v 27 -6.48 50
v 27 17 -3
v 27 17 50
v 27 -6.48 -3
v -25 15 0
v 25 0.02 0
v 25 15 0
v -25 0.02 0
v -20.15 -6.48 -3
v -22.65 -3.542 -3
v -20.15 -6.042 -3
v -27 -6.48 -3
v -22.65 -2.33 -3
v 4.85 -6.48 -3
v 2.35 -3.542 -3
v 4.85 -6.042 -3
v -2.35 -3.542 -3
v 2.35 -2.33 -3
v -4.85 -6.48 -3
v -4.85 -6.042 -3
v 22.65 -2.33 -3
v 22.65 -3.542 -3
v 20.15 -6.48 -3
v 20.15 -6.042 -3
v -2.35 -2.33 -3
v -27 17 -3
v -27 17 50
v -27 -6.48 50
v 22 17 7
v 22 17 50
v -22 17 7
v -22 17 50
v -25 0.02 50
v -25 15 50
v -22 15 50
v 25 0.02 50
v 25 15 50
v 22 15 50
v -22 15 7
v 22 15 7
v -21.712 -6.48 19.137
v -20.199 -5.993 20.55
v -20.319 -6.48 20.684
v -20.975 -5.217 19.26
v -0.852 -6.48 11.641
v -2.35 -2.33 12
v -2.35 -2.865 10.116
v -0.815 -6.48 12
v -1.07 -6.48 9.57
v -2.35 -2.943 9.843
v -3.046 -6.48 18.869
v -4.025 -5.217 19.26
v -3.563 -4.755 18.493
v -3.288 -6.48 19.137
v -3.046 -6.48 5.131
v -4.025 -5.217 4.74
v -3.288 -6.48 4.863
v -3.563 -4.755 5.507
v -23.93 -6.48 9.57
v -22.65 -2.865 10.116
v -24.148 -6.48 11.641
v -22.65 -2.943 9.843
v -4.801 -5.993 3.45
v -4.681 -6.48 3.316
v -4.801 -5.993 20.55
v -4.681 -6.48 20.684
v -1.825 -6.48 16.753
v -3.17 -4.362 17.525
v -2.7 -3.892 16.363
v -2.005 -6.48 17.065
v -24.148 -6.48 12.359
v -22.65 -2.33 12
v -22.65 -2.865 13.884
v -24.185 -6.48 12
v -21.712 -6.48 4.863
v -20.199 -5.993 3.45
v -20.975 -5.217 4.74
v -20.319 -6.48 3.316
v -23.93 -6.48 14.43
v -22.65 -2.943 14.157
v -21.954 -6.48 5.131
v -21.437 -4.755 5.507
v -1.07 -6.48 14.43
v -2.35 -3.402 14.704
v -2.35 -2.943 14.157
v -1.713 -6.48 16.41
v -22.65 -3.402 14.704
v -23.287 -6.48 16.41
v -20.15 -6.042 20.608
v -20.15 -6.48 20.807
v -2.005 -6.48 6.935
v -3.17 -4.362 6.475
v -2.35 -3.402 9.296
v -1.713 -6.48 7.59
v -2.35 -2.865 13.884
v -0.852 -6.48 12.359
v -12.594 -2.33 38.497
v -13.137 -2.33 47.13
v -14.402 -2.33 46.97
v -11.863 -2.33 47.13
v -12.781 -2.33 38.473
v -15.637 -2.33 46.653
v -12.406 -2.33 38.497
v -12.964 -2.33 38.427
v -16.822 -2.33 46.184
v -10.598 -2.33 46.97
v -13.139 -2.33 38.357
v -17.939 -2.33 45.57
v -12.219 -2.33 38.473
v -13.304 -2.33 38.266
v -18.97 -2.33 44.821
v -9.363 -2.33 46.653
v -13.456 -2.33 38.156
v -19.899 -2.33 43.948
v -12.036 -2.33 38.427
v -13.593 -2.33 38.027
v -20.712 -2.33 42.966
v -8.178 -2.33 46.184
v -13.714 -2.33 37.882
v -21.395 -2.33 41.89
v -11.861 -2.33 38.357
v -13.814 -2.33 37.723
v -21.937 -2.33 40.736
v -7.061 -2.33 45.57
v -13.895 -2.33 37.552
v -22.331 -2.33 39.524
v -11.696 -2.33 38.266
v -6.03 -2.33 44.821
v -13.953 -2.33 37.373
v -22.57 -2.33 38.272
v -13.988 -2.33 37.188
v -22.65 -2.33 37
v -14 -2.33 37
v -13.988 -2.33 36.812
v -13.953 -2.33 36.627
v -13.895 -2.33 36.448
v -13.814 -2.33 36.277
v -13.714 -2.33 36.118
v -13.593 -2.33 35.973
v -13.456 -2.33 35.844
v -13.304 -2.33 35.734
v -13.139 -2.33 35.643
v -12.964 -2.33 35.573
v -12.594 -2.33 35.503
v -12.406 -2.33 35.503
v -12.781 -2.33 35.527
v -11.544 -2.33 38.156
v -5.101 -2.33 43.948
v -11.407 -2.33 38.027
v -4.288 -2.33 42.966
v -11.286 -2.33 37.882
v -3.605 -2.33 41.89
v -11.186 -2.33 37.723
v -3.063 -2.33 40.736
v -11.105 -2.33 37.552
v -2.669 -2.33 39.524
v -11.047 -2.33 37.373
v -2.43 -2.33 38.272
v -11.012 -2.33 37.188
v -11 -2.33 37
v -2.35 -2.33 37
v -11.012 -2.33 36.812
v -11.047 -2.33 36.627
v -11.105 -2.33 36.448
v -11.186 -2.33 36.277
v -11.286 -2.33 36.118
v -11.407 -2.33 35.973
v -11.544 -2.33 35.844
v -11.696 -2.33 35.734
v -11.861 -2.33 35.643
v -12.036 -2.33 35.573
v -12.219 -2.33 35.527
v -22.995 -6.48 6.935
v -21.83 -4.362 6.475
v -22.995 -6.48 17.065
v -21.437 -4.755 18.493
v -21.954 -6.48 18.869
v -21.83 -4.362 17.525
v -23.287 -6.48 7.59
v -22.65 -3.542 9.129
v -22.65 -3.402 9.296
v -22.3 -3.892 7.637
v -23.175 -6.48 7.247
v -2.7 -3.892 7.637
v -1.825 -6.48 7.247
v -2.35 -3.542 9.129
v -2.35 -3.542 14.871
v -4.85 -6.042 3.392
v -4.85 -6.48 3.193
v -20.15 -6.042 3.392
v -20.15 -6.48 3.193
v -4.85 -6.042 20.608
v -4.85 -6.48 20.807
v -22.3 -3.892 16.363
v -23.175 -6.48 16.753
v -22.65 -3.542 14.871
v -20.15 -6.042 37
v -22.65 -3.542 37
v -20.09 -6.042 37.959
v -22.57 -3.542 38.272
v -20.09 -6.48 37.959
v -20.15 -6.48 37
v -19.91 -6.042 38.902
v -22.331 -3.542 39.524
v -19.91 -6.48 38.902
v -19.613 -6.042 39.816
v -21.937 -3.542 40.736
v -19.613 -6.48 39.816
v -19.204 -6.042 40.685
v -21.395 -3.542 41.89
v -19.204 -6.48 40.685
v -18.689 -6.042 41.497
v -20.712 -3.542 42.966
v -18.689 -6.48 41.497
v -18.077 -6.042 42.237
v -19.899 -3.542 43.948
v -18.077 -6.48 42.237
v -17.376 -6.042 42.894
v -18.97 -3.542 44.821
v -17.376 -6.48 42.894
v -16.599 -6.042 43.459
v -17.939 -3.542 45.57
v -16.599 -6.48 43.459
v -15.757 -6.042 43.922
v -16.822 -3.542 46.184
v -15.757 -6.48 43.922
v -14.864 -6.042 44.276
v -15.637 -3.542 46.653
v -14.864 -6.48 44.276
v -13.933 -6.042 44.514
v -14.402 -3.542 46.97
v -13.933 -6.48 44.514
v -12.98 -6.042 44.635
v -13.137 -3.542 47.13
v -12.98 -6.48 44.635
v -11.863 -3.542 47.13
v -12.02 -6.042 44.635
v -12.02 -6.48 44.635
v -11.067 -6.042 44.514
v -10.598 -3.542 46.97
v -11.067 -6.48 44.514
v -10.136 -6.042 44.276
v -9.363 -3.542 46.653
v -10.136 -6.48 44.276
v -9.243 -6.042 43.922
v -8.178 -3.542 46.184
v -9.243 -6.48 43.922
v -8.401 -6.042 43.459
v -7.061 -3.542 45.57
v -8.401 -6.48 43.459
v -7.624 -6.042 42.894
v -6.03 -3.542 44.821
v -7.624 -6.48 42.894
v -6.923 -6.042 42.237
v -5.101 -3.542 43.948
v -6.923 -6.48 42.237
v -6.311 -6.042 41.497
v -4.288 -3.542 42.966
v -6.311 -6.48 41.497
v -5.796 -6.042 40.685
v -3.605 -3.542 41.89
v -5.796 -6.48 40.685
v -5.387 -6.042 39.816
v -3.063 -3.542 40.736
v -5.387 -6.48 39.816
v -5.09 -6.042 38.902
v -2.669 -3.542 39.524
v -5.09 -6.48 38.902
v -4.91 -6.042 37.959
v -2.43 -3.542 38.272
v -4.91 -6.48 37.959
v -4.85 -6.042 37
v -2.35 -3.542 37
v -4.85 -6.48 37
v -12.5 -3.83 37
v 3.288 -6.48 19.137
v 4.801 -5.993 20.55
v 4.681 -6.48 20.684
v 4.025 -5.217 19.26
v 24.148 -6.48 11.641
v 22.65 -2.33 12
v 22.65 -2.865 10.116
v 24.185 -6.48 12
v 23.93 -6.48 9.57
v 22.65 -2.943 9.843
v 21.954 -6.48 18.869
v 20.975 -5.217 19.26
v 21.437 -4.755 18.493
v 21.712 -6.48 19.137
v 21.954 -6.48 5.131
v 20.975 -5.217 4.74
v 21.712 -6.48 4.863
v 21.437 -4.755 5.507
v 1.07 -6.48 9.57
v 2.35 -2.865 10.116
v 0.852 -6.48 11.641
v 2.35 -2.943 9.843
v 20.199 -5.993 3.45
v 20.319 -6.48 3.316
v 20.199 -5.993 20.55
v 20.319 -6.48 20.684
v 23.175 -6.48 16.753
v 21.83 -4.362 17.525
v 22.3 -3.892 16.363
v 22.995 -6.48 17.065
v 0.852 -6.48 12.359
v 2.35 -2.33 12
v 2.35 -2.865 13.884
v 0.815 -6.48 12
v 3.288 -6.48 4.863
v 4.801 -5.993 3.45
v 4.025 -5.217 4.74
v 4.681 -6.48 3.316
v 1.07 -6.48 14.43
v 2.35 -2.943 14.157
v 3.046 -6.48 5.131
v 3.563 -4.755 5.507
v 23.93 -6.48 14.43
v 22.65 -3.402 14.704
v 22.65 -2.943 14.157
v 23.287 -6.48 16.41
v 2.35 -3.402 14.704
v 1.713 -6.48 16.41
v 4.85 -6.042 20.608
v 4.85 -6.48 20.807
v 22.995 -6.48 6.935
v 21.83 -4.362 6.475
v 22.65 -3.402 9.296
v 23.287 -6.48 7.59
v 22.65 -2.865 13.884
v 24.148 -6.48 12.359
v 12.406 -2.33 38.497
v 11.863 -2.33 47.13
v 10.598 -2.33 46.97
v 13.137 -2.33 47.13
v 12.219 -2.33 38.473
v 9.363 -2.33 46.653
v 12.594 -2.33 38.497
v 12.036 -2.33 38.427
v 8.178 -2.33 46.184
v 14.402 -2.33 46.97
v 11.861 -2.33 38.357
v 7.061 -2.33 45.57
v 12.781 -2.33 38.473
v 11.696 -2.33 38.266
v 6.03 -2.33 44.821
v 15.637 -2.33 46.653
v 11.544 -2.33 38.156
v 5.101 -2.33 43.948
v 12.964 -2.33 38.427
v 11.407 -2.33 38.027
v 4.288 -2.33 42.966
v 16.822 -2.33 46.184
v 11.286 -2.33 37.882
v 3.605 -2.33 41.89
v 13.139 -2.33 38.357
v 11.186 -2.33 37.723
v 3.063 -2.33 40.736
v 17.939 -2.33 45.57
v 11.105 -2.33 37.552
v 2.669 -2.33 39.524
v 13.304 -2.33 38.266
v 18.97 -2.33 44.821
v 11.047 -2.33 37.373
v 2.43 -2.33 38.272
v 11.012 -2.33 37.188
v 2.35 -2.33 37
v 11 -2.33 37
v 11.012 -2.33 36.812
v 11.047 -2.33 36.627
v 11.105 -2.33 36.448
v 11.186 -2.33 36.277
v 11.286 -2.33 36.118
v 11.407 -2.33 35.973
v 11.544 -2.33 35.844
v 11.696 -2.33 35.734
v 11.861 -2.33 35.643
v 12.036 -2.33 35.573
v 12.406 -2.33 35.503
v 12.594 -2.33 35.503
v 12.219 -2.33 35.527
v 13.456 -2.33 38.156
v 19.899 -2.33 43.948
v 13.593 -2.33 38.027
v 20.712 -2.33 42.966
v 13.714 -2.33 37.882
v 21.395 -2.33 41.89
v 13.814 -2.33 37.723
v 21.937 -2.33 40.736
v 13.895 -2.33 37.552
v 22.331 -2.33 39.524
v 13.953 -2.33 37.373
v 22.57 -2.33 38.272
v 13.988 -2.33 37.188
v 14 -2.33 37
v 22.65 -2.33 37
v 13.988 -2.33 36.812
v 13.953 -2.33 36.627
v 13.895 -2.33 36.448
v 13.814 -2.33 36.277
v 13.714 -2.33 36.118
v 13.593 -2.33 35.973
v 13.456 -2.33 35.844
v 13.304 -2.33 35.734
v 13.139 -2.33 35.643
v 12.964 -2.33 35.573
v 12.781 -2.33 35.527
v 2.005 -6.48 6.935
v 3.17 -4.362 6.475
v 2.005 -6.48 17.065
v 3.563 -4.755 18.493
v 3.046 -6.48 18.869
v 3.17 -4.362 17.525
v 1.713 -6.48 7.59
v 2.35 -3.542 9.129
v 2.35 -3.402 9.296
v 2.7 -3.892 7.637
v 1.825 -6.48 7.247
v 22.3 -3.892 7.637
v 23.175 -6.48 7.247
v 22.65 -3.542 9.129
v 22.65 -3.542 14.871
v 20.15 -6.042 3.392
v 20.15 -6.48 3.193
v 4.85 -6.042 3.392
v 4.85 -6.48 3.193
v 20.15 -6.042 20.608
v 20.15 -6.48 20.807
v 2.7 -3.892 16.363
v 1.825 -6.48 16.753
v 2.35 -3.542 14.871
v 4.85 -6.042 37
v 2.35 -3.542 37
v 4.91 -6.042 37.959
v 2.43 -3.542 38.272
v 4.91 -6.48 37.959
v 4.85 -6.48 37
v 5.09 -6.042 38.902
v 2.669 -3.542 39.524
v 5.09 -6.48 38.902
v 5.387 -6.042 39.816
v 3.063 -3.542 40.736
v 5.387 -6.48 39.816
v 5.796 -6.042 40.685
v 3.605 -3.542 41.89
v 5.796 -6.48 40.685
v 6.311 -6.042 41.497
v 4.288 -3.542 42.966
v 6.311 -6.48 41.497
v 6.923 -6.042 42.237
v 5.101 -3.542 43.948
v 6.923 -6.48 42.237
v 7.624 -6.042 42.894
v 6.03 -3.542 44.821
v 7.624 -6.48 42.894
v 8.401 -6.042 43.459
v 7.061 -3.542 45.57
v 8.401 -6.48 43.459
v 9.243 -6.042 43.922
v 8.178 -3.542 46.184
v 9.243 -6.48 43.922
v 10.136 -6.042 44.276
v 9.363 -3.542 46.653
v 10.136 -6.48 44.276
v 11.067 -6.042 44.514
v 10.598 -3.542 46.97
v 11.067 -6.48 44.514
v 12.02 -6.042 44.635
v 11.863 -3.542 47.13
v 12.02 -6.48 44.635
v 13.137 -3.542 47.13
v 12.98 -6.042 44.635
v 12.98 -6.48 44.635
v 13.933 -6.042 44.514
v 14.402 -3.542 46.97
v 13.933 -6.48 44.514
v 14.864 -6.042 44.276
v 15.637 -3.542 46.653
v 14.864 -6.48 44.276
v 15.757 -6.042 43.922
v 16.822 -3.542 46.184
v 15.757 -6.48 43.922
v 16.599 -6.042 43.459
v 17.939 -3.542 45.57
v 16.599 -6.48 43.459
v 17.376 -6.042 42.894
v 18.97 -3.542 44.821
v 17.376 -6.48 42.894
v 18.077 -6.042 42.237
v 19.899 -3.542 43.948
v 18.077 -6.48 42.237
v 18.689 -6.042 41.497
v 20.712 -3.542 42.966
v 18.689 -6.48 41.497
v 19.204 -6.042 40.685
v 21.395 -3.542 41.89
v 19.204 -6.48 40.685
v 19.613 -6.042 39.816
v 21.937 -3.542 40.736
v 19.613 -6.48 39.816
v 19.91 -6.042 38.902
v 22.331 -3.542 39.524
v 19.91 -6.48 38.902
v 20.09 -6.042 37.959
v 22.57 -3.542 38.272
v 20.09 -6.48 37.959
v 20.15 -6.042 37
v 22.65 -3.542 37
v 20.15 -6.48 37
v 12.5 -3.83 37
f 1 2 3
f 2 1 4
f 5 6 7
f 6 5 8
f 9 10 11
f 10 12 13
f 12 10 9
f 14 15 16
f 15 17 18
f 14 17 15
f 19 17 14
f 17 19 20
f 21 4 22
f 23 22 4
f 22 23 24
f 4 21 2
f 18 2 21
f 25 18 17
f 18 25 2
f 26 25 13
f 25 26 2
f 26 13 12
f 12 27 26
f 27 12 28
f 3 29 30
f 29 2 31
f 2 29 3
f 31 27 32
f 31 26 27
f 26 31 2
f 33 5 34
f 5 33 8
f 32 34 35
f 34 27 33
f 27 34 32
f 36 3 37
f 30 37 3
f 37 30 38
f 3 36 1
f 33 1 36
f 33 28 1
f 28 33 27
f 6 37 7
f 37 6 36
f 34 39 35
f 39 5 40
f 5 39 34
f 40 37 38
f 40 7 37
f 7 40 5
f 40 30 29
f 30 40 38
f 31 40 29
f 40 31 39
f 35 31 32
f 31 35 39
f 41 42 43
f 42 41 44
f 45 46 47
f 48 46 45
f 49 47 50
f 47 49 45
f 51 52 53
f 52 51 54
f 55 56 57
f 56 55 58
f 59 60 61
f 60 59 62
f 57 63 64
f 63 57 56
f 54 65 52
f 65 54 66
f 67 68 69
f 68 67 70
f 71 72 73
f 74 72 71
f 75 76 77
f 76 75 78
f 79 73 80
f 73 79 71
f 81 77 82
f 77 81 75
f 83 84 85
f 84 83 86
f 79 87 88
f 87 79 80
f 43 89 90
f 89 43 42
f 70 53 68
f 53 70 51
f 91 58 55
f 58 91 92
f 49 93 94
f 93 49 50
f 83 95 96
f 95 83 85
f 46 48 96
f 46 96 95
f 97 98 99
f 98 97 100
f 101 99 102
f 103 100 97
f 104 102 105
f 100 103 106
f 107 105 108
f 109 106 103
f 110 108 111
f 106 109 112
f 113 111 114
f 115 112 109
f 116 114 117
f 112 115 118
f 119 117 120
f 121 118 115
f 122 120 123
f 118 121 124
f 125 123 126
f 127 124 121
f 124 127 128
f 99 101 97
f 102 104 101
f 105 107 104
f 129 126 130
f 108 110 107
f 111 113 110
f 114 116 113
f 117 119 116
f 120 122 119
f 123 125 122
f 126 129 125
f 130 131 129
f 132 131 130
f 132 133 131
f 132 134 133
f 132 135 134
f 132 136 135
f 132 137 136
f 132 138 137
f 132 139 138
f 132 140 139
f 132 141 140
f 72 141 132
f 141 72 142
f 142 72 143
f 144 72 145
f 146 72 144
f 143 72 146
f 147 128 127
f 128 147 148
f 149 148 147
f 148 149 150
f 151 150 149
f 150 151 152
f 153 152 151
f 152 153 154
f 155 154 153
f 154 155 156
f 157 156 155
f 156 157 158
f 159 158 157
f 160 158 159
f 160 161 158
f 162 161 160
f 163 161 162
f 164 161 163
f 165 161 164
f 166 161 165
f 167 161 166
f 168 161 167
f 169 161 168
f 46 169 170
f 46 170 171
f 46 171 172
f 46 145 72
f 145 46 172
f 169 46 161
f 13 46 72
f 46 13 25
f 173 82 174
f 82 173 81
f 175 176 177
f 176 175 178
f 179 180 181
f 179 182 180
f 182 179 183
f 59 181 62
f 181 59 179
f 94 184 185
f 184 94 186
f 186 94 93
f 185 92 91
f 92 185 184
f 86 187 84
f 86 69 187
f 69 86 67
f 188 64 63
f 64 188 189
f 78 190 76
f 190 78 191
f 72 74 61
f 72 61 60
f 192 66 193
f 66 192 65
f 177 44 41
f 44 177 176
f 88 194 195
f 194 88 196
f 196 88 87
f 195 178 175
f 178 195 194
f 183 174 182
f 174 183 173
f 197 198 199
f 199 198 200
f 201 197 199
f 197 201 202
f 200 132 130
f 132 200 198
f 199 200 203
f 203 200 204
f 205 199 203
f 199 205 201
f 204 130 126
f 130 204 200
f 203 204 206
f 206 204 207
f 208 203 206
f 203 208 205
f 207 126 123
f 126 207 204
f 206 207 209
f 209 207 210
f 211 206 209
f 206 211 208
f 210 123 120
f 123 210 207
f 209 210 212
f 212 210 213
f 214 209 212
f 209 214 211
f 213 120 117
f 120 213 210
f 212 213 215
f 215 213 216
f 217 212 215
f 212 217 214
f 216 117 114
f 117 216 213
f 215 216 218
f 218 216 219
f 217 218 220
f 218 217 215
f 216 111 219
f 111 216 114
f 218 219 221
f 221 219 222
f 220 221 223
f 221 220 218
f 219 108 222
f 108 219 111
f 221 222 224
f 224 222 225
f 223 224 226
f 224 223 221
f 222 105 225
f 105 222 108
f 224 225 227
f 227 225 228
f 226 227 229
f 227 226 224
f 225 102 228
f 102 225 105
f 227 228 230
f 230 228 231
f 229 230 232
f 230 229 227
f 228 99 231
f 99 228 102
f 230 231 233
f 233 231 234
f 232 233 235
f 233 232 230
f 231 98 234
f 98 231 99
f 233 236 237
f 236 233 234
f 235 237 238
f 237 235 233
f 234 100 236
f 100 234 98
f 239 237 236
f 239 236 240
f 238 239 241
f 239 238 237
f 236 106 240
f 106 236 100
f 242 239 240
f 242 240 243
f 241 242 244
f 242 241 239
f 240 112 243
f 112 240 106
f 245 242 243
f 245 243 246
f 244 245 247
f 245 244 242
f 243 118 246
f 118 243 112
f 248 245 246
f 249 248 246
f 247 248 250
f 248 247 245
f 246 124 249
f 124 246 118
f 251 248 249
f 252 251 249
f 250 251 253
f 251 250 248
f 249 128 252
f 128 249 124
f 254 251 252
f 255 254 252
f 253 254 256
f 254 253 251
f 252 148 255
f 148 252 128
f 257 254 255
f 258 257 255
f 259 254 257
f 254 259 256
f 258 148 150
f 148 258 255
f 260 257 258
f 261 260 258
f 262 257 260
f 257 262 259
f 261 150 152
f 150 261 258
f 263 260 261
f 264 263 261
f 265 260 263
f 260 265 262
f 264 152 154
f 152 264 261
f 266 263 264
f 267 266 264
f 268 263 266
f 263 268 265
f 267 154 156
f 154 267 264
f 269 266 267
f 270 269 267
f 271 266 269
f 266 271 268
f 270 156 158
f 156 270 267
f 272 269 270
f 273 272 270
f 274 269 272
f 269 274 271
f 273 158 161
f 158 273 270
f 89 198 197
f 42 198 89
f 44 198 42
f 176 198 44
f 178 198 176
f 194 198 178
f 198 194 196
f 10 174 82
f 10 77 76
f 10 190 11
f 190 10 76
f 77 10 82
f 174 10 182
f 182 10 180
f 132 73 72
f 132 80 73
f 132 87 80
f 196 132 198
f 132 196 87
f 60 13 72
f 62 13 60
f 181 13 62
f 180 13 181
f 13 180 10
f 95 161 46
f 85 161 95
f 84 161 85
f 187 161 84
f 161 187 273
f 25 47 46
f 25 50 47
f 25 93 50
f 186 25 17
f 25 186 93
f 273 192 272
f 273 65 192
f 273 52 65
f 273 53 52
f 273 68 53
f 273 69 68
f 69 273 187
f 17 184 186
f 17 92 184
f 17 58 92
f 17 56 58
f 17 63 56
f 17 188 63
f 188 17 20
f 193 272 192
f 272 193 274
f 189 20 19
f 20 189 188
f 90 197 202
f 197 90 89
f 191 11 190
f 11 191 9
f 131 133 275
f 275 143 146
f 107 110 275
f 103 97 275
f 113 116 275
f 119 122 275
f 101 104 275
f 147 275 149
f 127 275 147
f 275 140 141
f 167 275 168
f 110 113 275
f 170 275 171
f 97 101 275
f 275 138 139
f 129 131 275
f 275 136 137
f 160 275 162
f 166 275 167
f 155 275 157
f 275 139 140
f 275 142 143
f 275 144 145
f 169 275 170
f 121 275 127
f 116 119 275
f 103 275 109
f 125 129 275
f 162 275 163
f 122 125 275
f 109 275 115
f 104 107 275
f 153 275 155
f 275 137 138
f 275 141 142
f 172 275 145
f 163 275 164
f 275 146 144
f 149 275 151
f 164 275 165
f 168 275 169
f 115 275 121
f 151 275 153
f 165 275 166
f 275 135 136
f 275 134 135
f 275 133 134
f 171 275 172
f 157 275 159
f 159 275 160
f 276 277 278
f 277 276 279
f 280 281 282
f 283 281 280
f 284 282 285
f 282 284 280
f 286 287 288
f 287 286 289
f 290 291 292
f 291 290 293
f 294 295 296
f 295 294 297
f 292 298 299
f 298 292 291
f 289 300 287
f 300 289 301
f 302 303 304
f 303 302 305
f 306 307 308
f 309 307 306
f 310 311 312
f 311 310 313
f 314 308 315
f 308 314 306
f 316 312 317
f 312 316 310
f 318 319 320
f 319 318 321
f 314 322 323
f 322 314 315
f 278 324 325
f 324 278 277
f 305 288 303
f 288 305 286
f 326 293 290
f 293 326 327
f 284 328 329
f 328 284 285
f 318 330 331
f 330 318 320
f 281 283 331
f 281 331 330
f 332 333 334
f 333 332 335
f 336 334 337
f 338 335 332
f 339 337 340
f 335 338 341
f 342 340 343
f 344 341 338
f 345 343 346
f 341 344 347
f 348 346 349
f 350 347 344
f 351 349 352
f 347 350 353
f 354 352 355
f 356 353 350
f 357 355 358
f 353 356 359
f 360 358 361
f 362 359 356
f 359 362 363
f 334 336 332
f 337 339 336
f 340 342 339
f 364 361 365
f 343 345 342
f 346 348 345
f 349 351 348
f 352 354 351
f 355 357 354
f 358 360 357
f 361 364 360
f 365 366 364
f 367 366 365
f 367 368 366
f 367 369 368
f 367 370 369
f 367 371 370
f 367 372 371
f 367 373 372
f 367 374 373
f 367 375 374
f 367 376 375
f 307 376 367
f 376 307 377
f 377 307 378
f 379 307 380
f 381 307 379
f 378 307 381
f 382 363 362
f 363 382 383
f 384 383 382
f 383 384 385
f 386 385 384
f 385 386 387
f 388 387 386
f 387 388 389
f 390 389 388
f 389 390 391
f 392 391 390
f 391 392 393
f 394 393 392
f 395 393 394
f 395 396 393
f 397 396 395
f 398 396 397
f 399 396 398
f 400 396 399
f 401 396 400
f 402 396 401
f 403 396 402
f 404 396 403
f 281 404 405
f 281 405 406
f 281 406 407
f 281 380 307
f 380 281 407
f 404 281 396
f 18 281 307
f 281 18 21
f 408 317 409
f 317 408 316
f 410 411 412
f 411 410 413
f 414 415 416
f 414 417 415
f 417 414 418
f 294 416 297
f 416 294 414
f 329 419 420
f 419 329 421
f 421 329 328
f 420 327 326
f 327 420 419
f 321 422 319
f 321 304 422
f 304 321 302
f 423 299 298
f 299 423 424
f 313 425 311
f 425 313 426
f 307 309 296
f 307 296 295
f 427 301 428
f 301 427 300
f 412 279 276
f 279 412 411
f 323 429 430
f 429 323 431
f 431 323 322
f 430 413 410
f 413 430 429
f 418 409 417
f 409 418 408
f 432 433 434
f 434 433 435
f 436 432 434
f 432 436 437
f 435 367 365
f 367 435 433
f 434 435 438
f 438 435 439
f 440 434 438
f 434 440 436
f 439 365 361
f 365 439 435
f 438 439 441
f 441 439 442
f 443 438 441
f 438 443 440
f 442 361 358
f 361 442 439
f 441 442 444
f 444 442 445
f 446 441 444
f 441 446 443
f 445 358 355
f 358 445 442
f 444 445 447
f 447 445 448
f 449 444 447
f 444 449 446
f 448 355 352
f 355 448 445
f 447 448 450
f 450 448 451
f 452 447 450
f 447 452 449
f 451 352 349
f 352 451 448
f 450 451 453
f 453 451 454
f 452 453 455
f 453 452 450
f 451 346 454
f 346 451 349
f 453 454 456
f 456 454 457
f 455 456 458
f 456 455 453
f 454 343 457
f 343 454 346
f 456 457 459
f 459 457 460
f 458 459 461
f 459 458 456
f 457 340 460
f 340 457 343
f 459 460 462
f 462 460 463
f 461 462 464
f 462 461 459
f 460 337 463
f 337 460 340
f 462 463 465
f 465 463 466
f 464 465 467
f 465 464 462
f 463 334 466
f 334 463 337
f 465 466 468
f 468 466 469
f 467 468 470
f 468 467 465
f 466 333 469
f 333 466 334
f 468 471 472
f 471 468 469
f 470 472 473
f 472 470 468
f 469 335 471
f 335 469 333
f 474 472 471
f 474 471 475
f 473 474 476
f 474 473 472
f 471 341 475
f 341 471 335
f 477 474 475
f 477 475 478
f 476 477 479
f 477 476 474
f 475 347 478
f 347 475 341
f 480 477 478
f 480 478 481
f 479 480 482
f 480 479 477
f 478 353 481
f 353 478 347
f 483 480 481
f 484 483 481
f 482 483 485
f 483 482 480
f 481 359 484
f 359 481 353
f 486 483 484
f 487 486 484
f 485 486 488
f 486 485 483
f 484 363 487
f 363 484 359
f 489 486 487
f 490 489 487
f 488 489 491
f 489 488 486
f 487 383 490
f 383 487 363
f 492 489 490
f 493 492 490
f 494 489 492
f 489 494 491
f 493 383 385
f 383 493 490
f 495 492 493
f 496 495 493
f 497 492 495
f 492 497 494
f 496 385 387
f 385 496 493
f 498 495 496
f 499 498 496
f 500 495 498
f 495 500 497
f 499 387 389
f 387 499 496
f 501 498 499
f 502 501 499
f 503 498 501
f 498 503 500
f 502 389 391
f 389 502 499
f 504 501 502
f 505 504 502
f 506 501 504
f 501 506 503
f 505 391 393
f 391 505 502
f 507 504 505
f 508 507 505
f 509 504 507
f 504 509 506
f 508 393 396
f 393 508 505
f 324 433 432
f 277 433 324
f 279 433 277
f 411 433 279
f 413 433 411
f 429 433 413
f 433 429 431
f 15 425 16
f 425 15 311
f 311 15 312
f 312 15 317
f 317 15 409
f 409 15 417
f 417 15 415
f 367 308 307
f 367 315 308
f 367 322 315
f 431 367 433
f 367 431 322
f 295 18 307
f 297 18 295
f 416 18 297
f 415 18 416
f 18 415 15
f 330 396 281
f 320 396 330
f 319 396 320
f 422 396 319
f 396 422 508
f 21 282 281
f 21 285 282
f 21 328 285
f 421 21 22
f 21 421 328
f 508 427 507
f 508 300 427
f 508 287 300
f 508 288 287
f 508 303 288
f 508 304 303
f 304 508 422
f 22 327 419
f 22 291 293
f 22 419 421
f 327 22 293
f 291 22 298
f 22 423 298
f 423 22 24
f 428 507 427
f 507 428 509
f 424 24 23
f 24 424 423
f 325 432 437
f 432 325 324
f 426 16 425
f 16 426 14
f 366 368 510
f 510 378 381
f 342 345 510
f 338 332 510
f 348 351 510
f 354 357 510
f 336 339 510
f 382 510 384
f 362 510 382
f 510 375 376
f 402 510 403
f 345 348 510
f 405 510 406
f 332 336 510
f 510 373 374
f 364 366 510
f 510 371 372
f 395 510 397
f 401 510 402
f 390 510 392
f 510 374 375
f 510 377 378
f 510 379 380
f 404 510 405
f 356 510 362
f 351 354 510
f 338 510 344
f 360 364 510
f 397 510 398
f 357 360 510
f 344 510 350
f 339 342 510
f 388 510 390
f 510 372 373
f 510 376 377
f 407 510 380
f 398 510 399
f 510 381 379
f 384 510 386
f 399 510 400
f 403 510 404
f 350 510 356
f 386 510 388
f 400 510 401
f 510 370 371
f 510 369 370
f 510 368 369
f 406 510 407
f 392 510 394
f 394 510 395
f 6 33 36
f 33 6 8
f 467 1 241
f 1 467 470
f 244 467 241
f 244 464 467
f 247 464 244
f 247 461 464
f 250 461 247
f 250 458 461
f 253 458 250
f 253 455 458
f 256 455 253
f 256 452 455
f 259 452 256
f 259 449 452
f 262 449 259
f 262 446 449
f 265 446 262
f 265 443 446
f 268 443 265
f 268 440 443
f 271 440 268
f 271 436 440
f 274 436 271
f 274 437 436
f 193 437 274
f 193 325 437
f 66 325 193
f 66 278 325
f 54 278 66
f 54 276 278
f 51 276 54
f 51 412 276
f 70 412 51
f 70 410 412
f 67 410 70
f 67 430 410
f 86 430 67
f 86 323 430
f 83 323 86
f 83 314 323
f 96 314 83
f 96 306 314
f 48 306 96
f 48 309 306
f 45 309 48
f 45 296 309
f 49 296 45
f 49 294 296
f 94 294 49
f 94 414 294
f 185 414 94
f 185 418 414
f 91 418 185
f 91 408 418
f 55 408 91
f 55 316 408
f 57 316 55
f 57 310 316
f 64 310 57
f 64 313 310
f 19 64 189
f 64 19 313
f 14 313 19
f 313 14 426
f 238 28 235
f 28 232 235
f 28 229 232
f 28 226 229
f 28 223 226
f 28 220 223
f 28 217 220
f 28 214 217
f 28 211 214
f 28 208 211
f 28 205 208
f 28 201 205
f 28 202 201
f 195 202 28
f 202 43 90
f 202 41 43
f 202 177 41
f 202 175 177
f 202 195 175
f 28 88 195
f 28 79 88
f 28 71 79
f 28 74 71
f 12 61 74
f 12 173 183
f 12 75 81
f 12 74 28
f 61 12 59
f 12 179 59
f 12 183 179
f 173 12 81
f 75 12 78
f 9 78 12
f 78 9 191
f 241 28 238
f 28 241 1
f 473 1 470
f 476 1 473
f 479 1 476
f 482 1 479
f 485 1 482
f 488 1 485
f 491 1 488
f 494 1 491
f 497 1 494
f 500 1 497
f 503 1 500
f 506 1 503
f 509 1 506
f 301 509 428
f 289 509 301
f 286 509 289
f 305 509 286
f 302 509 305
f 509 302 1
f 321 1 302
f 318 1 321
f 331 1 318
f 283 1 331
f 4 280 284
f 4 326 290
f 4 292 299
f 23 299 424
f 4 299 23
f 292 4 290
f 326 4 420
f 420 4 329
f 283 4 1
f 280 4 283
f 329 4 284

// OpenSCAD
/*Created by Andy Levesque
Credit to @David D on Printables and Jonathan at Keep Making for Multiconnect and Multiboard, respectively
Licensed Creative Commons 4.0 Attribution Non-Commercial Sharable with Attribution

Notes:
- Slot test fit - For a slot test fit, set the following parameters
    - internalDepth = 0
    - internalHeight = 25
    - internalWidth = 0
    - wallThickness = 0
*/

/* [Internal Dimensions] */
//Height (in mm) from the top of the back to the base of the internal floor
internalHeight = 50.0;
//Width (in mm) of the internal dimension or item you wish to hold
internalWidth = 50.0; 
//Length (i.e., distance from back) (in mm) of the internal dimension or item you wish to hold
internalDepth = 15.0;

/* [Front Cutout Customizations] */
//cut out the front
frontCutout = true; 
//Distance upward from the bottom (in mm) that captures the bottom front of the item
frontLowerCapture = 7;
//Distance downward from the top (in mm) that captures the top front of the item. Use zero (0) for a cutout top. May require printing supports if used. 
frontUpperCapture = 0;
//Distance inward from the sides (in mm) that captures the sides of the item
frontLateralCapture = 3;


/*[Bottom Cutout Customizations]*/
//Cut out the bottom 
bottomCutout = false;
//Distance inward from the front (in mm) that captures the bottom of the item
bottomFrontCapture = 3;
//Distance inward from the back (in mm) that captures the bottom of the item
bottomBackCapture = 3;
//Distance inward from the sides (in mm) that captures the bottom of the item
bottomSideCapture = 3;

/*[Cord Cutout Customizations]*/
//cut out a slot on the bottom and through the front for a cord to connect to the device
cordCutout = false;
//diameter/width of cord cutout
cordCutoutDiameter = 10;
//move the cord cutout left (positive) or right (negative) (in mm)
cordCutoutLateralOffset = 0;
//move the cord cutout forward (positive) and back (negative) (in mm)
cordCutoutDepthOffset = 0;

/* [Right Cutout Customizations] */
rightCutout = false; 
//Distance upward from the bottom (in mm) that captures the bottom right of the item
rightLowerCapture = 7;
//Distance downward from the top (in mm) that captures the bottom right of the item. Use zero (0) for a cutout top. May require printing supports if used. 
rightUpperCapture = 0;
//Distance inward from the sides (in mm) that captures the sides of the item
rightLateralCapture = 3;


/* [Left Cutout Customizations] */
leftCutout = false; 
//Distance upward from the bottom (in mm) that captures the upper left of the item
leftLowerCapture = 7;
//Distance downward from the top (in mm) that captures the upper left of the item. Use zero (0) for a cutout top. May require printing supports if used. 
leftUpperCapture = 0;
//Distance inward from the sides (in mm) that captures the sides of the item
leftLateralCapture = 3;


/* [Additional Customization] */
//Thickness of bin walls (in mm)
wallThickness = 2; //.1
//Thickness of bin  (in mm)
baseThickness = 3; //.1

/*[Slot Customization]*/
//Distance between Multiconnect slots on the back (25mm is standard for MultiBoard)
distanceBetweenSlots = 25;
//QuickRelease removes the small indent in the top of the slots that lock the part into place
slotQuickRelease = false;
//Dimple scale tweaks the size of the dimple in the slot for printers that need a larger dimple to print correctly
dimpleScale = 1; //[0.5:.05:1.5]
//Scale the size of slots in the back (1.015 scale is default for a tight fit. Increase if your finding poor fit. )
slotTolerance = 1.00; //[0.925:0.005:1.075]
//Move the slot in (positive) or out (negative)
slotDepthMicroadjustment = 0; //[-.5:0.05:.5]
//enable a slot on-ramp for easy mounting of tall items
onRampEnabled = true;
//frequency of slots for on-ramp. 1 = every slot; 2 = every 2 slots; etc.
onRampEveryXSlots = 1;

/* [Hidden] */

//Calculated
totalHeight = internalHeight+baseThickness;
totalDepth = internalDepth + wallThickness;
totalWidth = internalWidth + wallThickness*2;
totalCenterX = internalWidth/2;

//move to center
union(){
translate(v = [-internalWidth/2,0,0]) 
    basket();
    //slotted back
translate([-max(totalWidth,distanceBetweenSlots)/2,0.02,-baseThickness])
    multiconnectBack(backWidth = totalWidth, backHeight = totalHeight, distanceBetweenSlots = distanceBetweenSlots);
}

//Create Basket
module basket() {
    difference() {
        union() {
            //bottom
            translate([-wallThickness,0,-baseThickness])
                cube([internalWidth + wallThickness*2, internalDepth + wallThickness,baseThickness]);

            //left wall
            translate([-wallThickness,0,0])
                cube([wallThickness, internalDepth + wallThickness, internalHeight]);

            //right wall
            translate([internalWidth,0,0])
                cube([wallThickness, internalDepth + wallThickness, internalHeight]);

            //front wall
                translate([0,internalDepth,0])
                    cube([internalWidth,wallThickness,internalHeight]);
        }

        //frontCaptureDeleteTool for item holders
            if (frontCutout == true)
                translate([frontLateralCapture,internalDepth-1,frontLowerCapture])
                    cube([internalWidth-frontLateralCapture*2,wallThickness+2,internalHeight-frontLowerCapture-frontUpperCapture+0.01]);
            if (bottomCutout == true)
                translate(v = [bottomSideCapture,bottomBackCapture,-baseThickness-1]) 
                    cube([internalWidth-bottomSideCapture*2,internalDepth-bottomFrontCapture-bottomBackCapture,baseThickness+2]);
                    //frontCaptureDeleteTool for item holders
            if (rightCutout == true)
                translate([-wallThickness-1,rightLateralCapture,rightLowerCapture])
                    cube([wallThickness+2,internalDepth-rightLateralCapture*2,internalHeight-rightLowerCapture-rightUpperCapture+0.01]);
            if (leftCutout == true)
                translate([internalWidth-1,leftLateralCapture,leftLowerCapture])
                    cube([wallThickness+2,internalDepth-leftLateralCapture*2,internalHeight-leftLowerCapture-leftUpperCapture+0.01]);
            if (cordCutout == true) {
                translate(v = [internalWidth/2+cordCutoutLateralOffset,internalDepth/2+cordCutoutDepthOffset,-baseThickness-1]) {
                    union(){
                        cylinder(h = baseThickness + frontLowerCapture + 2, r = cordCutoutDiameter/2);
                        translate(v = [-cordCutoutDiameter/2,0,0]) cube([cordCutoutDiameter,internalWidth/2+wallThickness+1,baseThickness + frontLowerCapture + 2]);
                    }
                }
            }
    }
    
}


//BEGIN MODULES
//Slotted back Module
module multiconnectBack(backWidth, backHeight, distanceBetweenSlots)
{
    //slot count calculates how many slots can fit on the back. Based on internal width for buffer. 
    //slot width needs to be at least the distance between slot for at least 1 slot to generate
    let (backWidth = max(backWidth,distanceBetweenSlots), backHeight = max(backHeight, 25),slotCount = floor(backWidth/distanceBetweenSlots), backThickness = 6.5){
        difference() {
            translate(v = [0,-backThickness,0]) cube(size = [backWidth,backThickness,backHeight]);
            //Loop through slots and center on the item
            //Note: I kept doing math until it looked right. It's possible this can be simplified.
            for (slotNum = [0:1:slotCount-1]) {
                translate(v = [distanceBetweenSlots/2+(backWidth/distanceBetweenSlots-slotCount)*distanceBetweenSlots/2+slotNum*distanceBetweenSlots,-2.35+slotDepthMicroadjustment,backHeight-13]) {
                    slotTool(backHeight);
                }
            }
        }
    }
    //Create Slot Tool
    module slotTool(totalHeight) {
        scale(v = slotTolerance)
        //slot minus optional dimple with optional on-ramp
        let (slotProfile = [[0,0],[10.15,0],[10.15,1.2121],[7.65,3.712],[7.65,5],[0,5]])
        difference() {
            union() {
                //round top
                rotate(a = [90,0,0,]) 
                    rotate_extrude($fn=50) 
                        polygon(points = slotProfile);
                //long slot
                translate(v = [0,0,0]) 
                    rotate(a = [180,0,0]) 
                    linear_extrude(height = totalHeight+1) 
                        union(){
                            polygon(points = slotProfile);
                            mirror([1,0,0])
                                polygon(points = slotProfile);
                        }
                //on-ramp
                if(onRampEnabled)
                    for(y = [1:onRampEveryXSlots:totalHeight/distanceBetweenSlots])
                        translate(v = [0,-5,-y*distanceBetweenSlots]) 
                            rotate(a = [-90,0,0]) 
                                cylinder(h = 5, r1 = 12, r2 = 10.15);
            }
            //dimple
            if (slotQuickRelease == false)
                scale(v = dimpleScale) 
                rotate(a = [90,0,0,]) 
                    rotate_extrude($fn=50) 
                        polygon(points = [[0,0],[0,1.5],[1.5,0]]);
        }
    }
}
